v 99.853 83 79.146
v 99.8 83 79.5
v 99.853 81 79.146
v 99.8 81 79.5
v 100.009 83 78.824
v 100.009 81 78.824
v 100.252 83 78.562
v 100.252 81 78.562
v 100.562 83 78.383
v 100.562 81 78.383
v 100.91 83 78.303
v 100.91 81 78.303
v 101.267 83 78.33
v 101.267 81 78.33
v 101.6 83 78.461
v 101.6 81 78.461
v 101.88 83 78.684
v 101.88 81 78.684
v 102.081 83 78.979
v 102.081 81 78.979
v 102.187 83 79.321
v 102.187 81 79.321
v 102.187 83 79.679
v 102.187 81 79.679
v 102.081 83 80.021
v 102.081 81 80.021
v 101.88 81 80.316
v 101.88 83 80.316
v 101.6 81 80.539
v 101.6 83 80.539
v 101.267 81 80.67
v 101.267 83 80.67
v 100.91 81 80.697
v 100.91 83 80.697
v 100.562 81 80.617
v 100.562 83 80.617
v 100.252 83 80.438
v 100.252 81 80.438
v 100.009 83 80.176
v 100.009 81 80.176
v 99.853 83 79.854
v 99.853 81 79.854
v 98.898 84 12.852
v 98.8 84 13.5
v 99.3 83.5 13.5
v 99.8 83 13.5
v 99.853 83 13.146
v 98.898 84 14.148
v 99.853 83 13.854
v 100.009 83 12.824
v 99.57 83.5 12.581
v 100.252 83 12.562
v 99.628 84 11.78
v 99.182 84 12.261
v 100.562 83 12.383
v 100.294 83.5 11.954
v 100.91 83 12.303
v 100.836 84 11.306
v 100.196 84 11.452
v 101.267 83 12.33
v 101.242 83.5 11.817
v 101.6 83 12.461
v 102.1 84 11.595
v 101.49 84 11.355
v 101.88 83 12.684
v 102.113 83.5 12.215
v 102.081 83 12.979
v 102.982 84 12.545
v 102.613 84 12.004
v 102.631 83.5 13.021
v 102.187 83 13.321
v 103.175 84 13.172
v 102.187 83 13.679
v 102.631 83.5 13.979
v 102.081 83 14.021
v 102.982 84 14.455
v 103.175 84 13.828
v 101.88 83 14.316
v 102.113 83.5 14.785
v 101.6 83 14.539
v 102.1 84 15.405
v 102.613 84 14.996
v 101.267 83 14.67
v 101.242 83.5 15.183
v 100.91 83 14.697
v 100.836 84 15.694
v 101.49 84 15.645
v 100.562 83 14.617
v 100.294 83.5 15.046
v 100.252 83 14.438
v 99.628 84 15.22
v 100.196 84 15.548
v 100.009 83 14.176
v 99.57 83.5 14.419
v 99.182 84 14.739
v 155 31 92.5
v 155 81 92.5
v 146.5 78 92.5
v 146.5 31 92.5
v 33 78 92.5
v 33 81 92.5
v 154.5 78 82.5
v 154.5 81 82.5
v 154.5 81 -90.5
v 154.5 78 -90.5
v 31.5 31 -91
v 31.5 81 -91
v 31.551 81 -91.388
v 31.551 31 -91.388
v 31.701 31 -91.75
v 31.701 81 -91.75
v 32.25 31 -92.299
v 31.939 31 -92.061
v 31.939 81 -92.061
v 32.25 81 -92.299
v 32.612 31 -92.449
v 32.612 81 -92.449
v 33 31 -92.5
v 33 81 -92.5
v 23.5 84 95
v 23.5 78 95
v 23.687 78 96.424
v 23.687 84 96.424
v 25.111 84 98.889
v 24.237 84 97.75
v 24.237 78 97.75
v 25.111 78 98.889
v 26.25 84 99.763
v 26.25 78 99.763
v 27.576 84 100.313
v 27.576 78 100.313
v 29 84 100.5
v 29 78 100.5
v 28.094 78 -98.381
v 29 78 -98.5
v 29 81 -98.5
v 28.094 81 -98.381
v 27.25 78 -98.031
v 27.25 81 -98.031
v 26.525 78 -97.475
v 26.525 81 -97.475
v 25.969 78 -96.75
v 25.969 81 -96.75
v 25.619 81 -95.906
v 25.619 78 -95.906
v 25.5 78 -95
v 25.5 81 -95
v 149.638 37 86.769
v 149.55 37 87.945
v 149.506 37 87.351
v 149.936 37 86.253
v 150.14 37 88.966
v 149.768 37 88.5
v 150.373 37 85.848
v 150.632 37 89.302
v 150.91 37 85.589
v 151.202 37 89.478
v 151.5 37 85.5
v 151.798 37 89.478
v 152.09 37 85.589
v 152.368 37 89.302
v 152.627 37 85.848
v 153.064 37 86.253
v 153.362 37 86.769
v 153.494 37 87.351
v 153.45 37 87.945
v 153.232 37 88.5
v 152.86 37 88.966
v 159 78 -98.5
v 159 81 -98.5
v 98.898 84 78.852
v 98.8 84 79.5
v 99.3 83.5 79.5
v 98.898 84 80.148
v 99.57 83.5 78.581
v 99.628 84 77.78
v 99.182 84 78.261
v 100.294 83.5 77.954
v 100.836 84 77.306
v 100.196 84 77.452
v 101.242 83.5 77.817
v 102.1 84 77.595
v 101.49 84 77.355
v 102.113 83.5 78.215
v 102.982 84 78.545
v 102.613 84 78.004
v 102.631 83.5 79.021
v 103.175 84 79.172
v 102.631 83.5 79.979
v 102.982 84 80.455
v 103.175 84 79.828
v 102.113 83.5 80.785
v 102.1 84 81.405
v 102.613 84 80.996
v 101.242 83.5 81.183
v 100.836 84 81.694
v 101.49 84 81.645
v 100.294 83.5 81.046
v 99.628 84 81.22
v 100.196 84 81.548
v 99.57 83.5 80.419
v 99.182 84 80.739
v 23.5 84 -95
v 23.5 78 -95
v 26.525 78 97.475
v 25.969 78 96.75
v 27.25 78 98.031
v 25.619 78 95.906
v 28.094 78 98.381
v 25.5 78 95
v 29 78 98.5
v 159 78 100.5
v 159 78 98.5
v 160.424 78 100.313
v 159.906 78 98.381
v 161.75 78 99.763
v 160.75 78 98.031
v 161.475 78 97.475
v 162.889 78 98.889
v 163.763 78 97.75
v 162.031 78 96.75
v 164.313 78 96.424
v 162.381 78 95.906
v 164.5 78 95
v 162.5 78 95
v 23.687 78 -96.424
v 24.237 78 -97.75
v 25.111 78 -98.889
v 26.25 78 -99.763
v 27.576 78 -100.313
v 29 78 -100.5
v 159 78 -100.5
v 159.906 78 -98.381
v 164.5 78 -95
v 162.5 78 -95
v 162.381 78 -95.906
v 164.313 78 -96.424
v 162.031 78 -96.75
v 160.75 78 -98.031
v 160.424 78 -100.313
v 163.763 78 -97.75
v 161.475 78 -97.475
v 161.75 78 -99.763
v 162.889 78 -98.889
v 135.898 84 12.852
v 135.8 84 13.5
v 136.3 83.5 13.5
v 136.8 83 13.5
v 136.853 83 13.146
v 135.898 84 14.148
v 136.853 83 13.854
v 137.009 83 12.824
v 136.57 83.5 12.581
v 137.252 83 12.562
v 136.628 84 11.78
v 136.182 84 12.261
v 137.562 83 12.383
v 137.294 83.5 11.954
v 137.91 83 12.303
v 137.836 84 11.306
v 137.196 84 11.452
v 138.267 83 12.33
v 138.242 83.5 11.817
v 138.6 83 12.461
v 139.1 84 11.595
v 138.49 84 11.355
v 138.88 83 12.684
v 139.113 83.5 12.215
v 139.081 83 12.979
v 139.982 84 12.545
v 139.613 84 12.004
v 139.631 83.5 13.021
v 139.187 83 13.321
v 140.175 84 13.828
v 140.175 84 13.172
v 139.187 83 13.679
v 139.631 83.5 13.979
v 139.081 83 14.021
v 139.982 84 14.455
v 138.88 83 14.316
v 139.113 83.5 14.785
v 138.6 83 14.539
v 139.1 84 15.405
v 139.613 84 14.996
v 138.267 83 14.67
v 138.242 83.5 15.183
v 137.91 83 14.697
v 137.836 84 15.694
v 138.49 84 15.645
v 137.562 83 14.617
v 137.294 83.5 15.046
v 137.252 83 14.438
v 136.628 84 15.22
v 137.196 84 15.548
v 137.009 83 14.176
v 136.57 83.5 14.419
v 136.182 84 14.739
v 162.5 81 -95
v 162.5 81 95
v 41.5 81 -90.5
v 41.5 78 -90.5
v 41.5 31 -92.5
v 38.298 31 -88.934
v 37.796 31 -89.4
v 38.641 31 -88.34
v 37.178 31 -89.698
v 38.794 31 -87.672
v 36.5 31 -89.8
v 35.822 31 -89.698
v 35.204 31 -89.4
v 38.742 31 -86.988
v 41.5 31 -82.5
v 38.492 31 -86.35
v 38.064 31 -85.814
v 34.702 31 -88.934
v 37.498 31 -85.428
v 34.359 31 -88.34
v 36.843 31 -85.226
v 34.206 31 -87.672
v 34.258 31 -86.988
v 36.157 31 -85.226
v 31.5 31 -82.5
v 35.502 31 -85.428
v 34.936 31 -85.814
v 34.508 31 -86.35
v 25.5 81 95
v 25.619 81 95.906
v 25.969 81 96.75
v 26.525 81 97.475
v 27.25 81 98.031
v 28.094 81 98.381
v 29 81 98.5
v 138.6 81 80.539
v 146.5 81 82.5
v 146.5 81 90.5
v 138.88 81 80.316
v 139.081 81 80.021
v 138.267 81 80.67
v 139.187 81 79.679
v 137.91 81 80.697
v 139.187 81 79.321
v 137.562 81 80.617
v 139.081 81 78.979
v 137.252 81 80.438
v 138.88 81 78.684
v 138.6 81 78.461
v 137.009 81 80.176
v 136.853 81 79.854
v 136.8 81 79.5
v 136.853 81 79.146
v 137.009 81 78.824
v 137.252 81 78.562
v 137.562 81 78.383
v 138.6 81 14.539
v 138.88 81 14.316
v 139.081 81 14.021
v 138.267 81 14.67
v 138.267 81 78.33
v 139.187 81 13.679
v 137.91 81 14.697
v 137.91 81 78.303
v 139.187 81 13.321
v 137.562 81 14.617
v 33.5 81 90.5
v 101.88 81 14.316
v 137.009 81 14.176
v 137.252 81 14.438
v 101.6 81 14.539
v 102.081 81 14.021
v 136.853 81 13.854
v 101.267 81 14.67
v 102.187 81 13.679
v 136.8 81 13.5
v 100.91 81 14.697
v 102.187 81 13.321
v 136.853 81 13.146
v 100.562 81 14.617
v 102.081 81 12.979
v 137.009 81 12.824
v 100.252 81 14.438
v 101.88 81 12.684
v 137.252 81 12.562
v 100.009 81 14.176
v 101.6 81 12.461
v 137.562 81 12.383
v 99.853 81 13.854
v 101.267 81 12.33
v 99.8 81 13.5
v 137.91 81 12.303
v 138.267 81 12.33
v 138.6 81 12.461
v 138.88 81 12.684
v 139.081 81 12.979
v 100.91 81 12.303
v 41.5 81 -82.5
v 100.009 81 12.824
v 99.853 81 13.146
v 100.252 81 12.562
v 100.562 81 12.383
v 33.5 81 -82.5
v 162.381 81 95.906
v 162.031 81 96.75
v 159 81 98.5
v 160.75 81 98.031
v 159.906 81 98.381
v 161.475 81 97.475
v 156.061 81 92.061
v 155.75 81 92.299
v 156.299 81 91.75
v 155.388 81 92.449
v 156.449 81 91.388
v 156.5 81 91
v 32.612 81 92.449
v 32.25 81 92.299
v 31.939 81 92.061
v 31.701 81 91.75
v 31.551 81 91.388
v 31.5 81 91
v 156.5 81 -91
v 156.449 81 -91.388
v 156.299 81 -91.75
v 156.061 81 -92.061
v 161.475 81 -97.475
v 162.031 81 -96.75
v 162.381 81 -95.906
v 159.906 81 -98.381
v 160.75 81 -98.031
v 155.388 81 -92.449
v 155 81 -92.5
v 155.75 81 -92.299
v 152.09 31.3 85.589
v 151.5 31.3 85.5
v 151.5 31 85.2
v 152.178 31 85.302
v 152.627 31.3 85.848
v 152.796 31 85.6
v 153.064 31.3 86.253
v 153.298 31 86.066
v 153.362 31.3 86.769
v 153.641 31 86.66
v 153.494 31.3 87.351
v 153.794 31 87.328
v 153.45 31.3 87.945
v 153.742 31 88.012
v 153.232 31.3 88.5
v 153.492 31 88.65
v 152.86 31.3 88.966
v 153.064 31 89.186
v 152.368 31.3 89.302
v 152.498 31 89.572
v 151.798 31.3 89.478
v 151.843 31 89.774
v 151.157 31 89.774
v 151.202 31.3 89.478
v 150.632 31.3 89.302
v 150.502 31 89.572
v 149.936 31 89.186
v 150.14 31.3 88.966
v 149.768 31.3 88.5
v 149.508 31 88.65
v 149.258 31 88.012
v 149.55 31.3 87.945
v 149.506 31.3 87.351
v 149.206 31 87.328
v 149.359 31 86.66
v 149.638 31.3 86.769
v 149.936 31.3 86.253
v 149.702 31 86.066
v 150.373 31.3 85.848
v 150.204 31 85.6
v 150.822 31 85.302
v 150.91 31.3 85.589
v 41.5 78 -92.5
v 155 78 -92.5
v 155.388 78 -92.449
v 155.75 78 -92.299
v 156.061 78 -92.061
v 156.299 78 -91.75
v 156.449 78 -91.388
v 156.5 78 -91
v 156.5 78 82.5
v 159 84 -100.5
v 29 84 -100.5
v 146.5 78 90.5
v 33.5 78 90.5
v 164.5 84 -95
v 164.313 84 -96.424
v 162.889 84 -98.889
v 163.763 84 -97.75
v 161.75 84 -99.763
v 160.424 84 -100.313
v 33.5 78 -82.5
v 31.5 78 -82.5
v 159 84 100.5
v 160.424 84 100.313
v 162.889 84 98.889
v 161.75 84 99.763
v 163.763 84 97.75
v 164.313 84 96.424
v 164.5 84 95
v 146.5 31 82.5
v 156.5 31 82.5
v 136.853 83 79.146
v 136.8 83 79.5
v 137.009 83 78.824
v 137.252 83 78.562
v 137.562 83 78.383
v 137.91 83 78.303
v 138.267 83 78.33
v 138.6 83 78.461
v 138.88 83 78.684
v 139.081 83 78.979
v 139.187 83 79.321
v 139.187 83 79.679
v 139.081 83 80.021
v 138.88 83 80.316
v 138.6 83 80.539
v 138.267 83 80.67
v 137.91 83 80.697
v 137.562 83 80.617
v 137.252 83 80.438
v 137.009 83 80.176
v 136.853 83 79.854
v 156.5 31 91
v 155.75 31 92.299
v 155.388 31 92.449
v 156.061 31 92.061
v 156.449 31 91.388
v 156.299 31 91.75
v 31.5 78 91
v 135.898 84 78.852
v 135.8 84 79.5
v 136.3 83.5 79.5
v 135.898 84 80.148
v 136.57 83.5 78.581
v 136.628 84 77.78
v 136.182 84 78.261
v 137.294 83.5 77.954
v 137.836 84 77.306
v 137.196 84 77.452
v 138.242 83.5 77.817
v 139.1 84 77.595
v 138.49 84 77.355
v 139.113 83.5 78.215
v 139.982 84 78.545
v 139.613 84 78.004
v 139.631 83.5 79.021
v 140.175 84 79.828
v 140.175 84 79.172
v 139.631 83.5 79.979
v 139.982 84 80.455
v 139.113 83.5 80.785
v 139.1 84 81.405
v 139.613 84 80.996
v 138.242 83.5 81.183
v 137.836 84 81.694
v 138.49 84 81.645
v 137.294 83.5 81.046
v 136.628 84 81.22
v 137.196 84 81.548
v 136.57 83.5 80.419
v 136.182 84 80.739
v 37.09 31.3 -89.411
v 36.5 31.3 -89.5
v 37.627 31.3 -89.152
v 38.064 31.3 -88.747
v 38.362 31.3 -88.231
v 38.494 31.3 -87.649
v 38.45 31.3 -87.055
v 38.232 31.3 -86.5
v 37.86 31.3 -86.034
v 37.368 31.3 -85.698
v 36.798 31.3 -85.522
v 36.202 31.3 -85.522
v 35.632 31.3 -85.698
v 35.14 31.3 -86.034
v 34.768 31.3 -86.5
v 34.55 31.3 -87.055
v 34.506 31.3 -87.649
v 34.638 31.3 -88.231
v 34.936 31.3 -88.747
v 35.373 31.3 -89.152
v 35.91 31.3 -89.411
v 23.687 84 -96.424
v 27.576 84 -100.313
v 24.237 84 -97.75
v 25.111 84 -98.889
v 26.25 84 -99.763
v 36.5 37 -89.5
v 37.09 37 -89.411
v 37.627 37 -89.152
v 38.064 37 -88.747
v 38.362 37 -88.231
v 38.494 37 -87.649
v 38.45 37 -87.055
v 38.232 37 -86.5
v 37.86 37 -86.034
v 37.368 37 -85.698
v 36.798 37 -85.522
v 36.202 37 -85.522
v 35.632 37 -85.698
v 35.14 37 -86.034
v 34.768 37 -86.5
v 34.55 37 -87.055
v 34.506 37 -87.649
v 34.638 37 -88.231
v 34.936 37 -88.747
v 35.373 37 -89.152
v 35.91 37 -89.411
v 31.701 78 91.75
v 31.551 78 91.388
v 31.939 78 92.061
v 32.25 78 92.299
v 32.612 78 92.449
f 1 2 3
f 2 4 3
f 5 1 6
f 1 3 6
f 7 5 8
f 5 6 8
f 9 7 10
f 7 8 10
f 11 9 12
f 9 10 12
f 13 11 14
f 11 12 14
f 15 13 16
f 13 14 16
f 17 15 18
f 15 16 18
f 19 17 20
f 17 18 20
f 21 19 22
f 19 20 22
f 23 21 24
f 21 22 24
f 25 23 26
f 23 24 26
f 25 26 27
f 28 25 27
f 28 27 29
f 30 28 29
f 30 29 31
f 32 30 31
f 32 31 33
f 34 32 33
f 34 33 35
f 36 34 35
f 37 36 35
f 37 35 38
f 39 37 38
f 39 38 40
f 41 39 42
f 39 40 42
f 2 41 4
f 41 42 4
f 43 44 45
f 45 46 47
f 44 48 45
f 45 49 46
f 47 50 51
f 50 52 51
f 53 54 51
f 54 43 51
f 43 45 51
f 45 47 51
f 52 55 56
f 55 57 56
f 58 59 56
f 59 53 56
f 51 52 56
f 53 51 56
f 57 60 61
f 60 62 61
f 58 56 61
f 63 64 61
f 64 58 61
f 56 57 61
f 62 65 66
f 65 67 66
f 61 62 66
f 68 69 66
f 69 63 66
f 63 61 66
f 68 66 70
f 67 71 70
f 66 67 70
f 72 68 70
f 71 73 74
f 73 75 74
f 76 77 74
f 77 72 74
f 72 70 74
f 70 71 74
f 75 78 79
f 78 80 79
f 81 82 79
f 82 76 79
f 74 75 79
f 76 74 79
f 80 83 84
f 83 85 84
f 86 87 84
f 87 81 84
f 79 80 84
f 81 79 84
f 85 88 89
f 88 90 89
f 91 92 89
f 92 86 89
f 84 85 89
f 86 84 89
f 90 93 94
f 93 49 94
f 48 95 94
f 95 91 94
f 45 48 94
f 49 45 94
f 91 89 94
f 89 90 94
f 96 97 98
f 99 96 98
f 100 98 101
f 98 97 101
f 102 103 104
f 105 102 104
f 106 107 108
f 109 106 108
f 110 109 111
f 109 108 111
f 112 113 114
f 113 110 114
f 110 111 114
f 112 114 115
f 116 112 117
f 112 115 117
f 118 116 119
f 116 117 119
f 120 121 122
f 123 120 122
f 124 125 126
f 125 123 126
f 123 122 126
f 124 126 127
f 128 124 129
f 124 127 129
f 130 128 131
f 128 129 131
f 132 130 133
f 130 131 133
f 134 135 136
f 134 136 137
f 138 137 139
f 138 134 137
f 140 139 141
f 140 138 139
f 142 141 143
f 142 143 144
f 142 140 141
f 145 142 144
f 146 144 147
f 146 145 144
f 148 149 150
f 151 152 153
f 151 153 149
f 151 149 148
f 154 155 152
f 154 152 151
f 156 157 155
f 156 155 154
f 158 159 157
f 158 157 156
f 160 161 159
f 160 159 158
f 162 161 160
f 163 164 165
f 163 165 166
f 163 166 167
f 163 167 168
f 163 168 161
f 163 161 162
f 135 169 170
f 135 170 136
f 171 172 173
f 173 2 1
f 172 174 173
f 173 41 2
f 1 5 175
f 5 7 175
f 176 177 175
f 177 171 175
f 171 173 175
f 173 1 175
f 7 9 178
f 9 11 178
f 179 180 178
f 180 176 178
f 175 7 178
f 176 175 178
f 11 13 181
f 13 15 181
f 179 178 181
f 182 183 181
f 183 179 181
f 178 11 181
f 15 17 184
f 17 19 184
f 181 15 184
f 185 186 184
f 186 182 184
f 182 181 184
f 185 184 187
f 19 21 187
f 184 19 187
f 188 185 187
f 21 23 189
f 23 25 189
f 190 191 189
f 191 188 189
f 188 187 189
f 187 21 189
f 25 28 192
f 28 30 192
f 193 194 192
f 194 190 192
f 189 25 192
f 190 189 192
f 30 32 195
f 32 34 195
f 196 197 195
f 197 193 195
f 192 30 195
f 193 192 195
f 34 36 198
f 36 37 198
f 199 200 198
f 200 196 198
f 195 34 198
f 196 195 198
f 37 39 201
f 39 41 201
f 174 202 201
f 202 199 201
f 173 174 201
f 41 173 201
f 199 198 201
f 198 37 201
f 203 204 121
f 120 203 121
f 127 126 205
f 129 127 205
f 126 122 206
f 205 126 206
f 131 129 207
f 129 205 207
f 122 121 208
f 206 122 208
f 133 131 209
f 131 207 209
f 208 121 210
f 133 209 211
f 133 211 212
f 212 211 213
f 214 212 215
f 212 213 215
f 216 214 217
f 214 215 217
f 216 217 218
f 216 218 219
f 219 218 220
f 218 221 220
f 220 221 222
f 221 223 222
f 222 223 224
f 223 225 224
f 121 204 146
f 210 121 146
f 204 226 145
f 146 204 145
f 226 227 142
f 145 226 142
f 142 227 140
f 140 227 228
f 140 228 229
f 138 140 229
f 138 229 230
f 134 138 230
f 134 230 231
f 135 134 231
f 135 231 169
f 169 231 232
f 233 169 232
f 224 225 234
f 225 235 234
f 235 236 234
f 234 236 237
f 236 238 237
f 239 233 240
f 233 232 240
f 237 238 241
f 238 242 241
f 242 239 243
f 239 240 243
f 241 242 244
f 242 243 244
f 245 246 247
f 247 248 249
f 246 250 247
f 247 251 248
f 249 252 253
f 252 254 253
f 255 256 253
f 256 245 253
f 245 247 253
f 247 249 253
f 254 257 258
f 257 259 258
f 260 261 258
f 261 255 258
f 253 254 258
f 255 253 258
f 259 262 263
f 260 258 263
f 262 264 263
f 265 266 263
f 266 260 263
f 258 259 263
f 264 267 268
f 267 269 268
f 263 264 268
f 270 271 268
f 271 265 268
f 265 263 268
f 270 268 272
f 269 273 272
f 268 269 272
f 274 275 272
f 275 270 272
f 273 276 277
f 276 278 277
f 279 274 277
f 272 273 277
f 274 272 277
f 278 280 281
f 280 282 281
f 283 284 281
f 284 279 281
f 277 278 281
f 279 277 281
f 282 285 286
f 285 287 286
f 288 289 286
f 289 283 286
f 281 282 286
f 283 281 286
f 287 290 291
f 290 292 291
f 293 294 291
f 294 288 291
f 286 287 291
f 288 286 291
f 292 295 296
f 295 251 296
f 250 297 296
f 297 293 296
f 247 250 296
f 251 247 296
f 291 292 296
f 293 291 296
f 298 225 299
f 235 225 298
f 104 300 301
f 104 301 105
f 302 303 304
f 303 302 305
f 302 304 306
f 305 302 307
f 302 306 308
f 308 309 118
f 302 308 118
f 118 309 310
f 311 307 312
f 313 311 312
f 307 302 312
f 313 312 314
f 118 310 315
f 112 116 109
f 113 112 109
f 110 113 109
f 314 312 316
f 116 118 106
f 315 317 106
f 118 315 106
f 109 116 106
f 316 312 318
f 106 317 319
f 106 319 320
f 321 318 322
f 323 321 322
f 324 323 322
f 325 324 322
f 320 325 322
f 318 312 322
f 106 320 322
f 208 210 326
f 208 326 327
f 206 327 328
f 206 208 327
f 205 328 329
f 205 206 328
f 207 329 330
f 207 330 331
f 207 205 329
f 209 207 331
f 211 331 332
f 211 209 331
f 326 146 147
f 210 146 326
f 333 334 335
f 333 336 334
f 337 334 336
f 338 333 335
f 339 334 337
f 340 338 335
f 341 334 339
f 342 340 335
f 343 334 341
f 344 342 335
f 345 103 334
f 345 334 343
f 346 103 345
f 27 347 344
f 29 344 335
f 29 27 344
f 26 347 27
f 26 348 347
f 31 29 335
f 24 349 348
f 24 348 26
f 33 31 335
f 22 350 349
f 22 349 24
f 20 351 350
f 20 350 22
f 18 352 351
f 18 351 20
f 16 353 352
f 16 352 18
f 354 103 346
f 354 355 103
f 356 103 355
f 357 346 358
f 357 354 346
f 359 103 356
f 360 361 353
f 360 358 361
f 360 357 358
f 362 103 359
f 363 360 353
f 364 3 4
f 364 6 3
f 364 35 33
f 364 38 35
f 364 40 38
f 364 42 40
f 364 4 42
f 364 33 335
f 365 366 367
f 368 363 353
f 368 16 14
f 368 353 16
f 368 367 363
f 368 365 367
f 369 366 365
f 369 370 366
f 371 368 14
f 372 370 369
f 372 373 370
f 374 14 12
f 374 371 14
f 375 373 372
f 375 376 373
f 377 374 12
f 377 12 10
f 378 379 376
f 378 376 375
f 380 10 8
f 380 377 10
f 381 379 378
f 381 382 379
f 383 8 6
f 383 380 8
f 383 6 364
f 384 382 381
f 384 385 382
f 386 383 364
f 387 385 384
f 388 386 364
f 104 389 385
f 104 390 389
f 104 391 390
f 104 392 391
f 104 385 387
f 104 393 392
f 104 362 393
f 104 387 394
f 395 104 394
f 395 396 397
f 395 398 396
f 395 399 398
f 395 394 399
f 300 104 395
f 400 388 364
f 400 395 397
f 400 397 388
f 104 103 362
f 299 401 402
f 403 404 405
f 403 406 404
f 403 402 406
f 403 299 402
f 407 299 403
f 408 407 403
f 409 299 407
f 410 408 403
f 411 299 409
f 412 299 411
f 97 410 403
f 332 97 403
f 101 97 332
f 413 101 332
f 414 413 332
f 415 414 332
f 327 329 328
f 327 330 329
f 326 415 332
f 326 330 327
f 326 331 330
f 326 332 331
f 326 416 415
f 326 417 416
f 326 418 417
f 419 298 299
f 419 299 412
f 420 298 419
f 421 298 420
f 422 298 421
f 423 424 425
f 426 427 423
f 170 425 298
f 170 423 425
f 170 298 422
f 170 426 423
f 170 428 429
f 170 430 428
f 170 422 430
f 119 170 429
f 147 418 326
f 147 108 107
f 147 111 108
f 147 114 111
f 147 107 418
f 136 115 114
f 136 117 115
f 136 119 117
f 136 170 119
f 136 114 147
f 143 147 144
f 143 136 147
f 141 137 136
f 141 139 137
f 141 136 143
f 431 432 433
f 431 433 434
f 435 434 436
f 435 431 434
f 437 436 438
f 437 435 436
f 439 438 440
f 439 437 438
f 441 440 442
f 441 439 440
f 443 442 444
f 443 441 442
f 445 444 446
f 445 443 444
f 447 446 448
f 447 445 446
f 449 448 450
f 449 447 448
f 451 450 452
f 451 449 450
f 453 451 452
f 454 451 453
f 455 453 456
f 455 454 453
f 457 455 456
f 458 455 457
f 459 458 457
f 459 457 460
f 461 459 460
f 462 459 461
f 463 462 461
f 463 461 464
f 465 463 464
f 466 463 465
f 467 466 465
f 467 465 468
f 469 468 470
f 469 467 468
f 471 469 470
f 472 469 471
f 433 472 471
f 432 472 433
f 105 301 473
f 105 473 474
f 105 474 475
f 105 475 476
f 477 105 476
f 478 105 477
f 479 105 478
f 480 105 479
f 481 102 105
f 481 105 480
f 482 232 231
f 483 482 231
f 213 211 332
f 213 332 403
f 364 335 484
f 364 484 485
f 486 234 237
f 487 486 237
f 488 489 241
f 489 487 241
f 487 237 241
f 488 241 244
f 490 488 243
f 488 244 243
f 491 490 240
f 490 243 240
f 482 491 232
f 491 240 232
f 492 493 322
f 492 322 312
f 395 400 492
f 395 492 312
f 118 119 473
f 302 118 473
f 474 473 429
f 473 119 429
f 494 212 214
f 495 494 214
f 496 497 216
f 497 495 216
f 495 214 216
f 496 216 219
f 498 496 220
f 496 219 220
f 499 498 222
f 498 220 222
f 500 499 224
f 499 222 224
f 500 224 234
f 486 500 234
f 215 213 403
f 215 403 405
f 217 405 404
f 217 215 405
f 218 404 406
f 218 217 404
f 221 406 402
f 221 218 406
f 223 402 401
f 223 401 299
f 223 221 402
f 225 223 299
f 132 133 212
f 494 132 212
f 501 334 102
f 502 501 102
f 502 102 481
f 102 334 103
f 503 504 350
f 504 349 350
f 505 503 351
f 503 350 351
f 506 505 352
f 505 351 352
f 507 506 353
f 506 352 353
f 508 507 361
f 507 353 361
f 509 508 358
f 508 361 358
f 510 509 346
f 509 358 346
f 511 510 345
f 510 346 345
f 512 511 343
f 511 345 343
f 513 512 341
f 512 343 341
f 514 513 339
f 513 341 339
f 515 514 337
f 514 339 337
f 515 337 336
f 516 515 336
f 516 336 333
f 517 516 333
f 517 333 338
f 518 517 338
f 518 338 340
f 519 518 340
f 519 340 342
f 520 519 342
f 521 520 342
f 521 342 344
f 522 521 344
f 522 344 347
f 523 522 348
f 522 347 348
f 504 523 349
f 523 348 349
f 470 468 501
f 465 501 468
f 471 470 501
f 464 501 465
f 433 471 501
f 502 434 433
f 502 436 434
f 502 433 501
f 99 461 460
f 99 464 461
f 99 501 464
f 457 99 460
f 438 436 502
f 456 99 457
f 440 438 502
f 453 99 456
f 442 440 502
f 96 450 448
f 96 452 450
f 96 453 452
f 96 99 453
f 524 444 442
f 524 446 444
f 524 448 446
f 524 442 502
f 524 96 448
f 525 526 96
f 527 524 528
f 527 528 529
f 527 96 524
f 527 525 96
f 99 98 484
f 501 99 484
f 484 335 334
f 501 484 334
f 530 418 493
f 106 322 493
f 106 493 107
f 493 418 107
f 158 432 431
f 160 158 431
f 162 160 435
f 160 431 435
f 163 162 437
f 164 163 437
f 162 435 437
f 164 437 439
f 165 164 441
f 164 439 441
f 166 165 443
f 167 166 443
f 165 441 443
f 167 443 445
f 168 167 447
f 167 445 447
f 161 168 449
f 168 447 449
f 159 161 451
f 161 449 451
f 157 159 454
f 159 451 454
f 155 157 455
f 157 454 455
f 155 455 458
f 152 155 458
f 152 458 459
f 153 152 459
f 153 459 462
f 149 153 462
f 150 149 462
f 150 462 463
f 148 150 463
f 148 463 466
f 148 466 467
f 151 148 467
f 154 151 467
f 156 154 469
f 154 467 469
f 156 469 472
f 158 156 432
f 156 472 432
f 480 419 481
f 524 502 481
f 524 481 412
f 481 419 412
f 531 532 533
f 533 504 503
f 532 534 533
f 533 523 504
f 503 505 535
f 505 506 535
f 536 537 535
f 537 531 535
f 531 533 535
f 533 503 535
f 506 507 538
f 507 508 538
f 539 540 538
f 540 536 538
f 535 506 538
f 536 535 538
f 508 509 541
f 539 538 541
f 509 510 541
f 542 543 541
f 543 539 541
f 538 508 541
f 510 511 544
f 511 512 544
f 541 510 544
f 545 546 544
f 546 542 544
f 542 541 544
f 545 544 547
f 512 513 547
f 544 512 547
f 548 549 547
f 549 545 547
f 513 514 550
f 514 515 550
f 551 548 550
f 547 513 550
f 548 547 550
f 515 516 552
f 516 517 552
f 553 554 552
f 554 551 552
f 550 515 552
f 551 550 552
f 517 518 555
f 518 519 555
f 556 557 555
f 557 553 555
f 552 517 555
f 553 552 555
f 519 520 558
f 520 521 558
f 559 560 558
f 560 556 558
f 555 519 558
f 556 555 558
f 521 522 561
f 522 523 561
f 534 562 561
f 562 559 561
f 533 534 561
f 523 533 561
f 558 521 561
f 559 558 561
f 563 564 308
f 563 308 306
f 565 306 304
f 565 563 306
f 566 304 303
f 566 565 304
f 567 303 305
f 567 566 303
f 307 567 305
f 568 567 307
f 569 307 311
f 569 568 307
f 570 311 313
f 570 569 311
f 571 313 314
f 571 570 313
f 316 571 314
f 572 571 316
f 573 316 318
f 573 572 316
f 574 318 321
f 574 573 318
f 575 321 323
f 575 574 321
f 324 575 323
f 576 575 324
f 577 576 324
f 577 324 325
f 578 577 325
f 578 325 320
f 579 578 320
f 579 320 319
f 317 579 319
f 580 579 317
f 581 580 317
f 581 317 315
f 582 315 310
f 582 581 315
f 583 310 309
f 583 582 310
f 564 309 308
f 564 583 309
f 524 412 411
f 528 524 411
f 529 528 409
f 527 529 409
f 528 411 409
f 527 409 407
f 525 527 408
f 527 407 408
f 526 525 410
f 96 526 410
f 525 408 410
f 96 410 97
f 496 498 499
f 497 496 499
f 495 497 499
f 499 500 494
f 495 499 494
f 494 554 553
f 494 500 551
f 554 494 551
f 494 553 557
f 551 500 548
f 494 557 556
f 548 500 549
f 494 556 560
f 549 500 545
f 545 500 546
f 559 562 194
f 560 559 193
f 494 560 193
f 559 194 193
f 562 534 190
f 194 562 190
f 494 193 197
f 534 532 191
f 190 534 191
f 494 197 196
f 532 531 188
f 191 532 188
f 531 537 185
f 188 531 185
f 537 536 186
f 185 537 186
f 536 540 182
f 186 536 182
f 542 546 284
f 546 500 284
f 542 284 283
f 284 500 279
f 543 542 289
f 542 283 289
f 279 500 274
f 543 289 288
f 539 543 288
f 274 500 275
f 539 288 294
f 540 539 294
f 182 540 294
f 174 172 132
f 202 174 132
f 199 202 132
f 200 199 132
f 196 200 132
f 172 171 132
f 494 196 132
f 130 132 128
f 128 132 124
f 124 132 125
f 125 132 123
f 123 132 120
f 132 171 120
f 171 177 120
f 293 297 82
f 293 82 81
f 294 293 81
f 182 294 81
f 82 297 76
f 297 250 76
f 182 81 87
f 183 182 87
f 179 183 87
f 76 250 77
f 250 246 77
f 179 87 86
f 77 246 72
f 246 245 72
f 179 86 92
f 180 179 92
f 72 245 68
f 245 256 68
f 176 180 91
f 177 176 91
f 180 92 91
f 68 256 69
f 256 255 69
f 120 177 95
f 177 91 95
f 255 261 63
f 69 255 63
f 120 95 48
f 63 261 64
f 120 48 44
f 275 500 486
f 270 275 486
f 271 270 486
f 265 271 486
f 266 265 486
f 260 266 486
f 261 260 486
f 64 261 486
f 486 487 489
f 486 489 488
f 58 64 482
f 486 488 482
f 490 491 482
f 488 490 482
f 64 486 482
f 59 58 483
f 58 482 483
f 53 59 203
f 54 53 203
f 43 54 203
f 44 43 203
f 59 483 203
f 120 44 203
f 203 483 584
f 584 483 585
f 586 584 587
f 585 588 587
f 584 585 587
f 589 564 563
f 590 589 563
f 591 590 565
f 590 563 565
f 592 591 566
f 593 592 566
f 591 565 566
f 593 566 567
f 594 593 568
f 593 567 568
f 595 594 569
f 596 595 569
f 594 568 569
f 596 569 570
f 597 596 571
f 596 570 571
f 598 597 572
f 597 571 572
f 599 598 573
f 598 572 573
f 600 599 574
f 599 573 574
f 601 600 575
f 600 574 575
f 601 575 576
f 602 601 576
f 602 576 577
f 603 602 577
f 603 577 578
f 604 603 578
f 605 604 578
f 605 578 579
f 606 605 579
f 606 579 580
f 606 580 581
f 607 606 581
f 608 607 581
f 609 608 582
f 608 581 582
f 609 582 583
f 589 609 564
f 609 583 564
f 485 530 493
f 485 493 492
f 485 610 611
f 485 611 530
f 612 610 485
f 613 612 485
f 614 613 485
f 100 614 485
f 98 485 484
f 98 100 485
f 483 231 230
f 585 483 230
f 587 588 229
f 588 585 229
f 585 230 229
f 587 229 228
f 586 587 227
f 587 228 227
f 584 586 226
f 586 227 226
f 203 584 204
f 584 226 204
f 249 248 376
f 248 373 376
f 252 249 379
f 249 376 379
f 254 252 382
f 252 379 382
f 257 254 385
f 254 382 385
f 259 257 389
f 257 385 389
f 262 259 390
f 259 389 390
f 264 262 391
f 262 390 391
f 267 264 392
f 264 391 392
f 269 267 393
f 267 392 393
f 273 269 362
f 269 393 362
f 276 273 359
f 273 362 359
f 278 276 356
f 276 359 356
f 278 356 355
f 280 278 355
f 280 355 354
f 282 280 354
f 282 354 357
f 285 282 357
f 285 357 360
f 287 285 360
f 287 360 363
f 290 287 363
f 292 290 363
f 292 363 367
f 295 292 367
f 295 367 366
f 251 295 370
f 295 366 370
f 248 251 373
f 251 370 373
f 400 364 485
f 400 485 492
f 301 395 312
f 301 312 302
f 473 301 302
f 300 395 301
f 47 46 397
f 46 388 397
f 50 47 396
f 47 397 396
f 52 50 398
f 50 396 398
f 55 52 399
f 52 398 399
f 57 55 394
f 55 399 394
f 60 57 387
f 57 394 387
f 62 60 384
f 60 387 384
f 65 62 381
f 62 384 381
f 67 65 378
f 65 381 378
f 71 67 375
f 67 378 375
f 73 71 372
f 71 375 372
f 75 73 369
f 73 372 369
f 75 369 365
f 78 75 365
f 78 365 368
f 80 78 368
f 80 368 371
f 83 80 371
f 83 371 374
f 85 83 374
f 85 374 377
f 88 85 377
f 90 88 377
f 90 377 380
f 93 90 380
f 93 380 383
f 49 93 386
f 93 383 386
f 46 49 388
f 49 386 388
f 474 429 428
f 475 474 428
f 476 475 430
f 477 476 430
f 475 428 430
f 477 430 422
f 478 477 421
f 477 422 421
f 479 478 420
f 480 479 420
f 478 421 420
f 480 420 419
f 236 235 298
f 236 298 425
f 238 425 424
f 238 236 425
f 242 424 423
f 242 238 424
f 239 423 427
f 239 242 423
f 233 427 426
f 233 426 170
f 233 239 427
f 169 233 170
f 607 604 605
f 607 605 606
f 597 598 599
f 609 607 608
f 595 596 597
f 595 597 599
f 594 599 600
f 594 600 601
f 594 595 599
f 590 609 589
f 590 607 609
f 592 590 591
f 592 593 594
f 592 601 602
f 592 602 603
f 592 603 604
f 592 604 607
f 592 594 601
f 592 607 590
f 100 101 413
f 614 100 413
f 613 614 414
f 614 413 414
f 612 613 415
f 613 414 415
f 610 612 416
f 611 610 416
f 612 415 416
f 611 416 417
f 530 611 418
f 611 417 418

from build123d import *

# Parameters (mm, degrees)
SALIENTE_EXTRUIR1_DEPTH                              = 3
SALIENTE_EXTRUIR2_START                              = -3
SALIENTE_EXTRUIR2_DEPTH                              = 3
SALIENTE_EXTRUIR4_DEPTH                              = 3
SALIENTE_EXTRUIR5_DEPTH                              = 50
AVELLANADO_PARA_TORNILLO_CON_CABEZA_PLAN_D           = 2.4
AVELLANADO_PARA_TORNILLO_CON_CABEZA_PLAN_CSINK_D     = 4.4
AVELLANADO_PARA_TORNILLO_CON_CABEZA_PLAN_CSINK_ANGLE = 90
CROQUIS11_R                                          = 2
CORTAR_EXTRUIR2_DEPTH                                = 6
CHAFL_N2_SIZE                                        = 0.3


with BuildPart() as part:
    # Croquis1 → Saliente-Extruir1 (new body)
    with BuildSketch(Plane(origin=(0, 81, 0), x_dir=(1, 0, 0), z_dir=(0, 1, 0))):
        with BuildLine():
            Line((164.5, -35), (164.5, -58))
            Line((164.5, -58), (164.5, -95))
            ThreePointArc((164.5, -95), (162.889087297, -98.889087297), (159, -100.5))
            Line((159, -100.5), (29, -100.5))
            ThreePointArc((29, -100.5), (25.110912703, -98.889087297), (23.5, -95))
            Line((23.5, -95), (23.5, 95))
            ThreePointArc((23.5, 95), (25.110912703, 98.889087297), (29, 100.5))
            Line((29, 100.5), (159, 100.5))
            ThreePointArc((159, 100.5), (162.889087297, 98.889087297), (164.5, 95))
            Line((164.5, 95), (164.5, -35))
        make_face()
    extrude(amount=SALIENTE_EXTRUIR1_DEPTH)

    # Croquis2 → Saliente-Extruir2 (add)
    with BuildSketch(Plane(origin=(0, 81, 0), x_dir=(1, 0, 0), z_dir=(0, 1, 0)).offset(SALIENTE_EXTRUIR2_START)):
        with BuildLine():
            Line((164.5, -95), (164.5, 95))
            ThreePointArc((164.5, 95), (162.889087297, 98.889087297), (159, 100.5))
            Line((159, 100.5), (29, 100.5))
            ThreePointArc((29, 100.5), (25.110912703, 98.889087297), (23.5, 95))
            Line((23.5, 95), (23.5, -95))
            ThreePointArc((23.5, -95), (25.110912703, -98.889087297), (29, -100.5))
            Line((29, -100.5), (159, -100.5))
            ThreePointArc((159, -100.5), (162.889087297, -98.889087297), (164.5, -95))
        make_face()
        with BuildLine():
            Line((162.5, -95), (162.5, 95))
            ThreePointArc((162.5, 95), (161.474873734, 97.474873734), (159, 98.5))
            Line((159, 98.5), (29, 98.5))
            ThreePointArc((29, 98.5), (26.525126266, 97.474873734), (25.5, 95))
            Line((25.5, 95), (25.5, -95))
            ThreePointArc((25.5, -95), (26.525126266, -97.474873734), (29, -98.5))
            Line((29, -98.5), (159, -98.5))
            ThreePointArc((159, -98.5), (161.474873734, -97.474873734), (162.5, -95))
        make_face(mode=Mode.SUBTRACT)
    extrude(amount=SALIENTE_EXTRUIR2_DEPTH)

    # Croquis4 → Saliente-Extruir4 (add)
    with BuildSketch(Plane.XZ.offset(-81)):
        with BuildLine():
            Line((33, -92.5), (155, -92.5))
            ThreePointArc((155, -92.5), (156.060660172, -92.060660172), (156.5, -91))
            Line((156.5, -91), (156.5, 35))
            Line((156.5, 35), (156.5, 58))
            Line((156.5, 58), (156.5, 91))
            ThreePointArc((156.5, 91), (156.060660172, 92.060660172), (155, 92.5))
            Line((155, 92.5), (33, 92.5))
            ThreePointArc((33, 92.5), (31.939339828, 92.060660172), (31.5, 91))
            Line((31.5, 91), (31.5, -91))
            ThreePointArc((31.5, -91), (31.939339828, -92.060660172), (33, -92.5))
        make_face()
        Polygon((33.5, -90.5), (154.5, -90.5), (154.5, 35), (154.5, 58), (154.5, 90.5), (33.5, 90.5), align=None, mode=Mode.SUBTRACT)
    extrude(amount=SALIENTE_EXTRUIR4_DEPTH)

    # Croquis5 → Saliente-Extruir5 (add)
    with BuildSketch(Plane.XZ.offset(-81)):
        with BuildLine():
            Line((155, 92.5), (146.5, 92.5))
            Line((146.5, 92.5), (146.5, 82.5))
            Line((146.5, 82.5), (156.5, 82.5))
            Line((156.5, 82.5), (156.5, 91))
            ThreePointArc((156.5, 91), (156.060660172, 92.060660172), (155, 92.5))
        make_face()
        with BuildLine():
            Line((31.5, -91), (31.5, -82.5))
            Line((31.5, -82.5), (41.5, -82.5))
            Line((41.5, -82.5), (41.5, -92.5))
            Line((41.5, -92.5), (33, -92.5))
            ThreePointArc((33, -92.5), (31.939339828, -92.060660172), (31.5, -91))
        make_face()
    extrude(amount=SALIENTE_EXTRUIR5_DEPTH)

    # Avellanado para tornillo con cabeza plana de M21 (through all)
    with Locations(Plane(origin=(0, 84, 0), x_dir=(1, 0, 0), z_dir=(0, 1, 0))):
        with Locations((138, -13.5), (101, -13.5), (138, -79.5), (101, -79.5)):
            CounterSinkHole(AVELLANADO_PARA_TORNILLO_CON_CABEZA_PLAN_D / 2, AVELLANADO_PARA_TORNILLO_CON_CABEZA_PLAN_CSINK_D / 2, counter_sink_angle=AVELLANADO_PARA_TORNILLO_CON_CABEZA_PLAN_CSINK_ANGLE)

    # Croquis11 → Cortar-Extruir2 (cut)
    with BuildSketch(Plane.XZ.offset(-31)):
        with Locations(Location((36.5, -87.5, 0), (0, 0, 270))):
            Circle(CROQUIS11_R)
        with Locations(Location((151.5, 87.5, 0), (0, 0, 270))):
            Circle(CROQUIS11_R)
    extrude(amount=-CORTAR_EXTRUIR2_DEPTH, mode=Mode.SUBTRACT)

    # Chaflán2
    chafl_n2_edges = [part.edges().sort_by_distance(p)[0] for p in [
        (36.5, 31, -85.5),
        (151.5, 31, 89.5),
    ]]
    chamfer(chafl_n2_edges, length=CHAFL_N2_SIZE)


solid = part.part
